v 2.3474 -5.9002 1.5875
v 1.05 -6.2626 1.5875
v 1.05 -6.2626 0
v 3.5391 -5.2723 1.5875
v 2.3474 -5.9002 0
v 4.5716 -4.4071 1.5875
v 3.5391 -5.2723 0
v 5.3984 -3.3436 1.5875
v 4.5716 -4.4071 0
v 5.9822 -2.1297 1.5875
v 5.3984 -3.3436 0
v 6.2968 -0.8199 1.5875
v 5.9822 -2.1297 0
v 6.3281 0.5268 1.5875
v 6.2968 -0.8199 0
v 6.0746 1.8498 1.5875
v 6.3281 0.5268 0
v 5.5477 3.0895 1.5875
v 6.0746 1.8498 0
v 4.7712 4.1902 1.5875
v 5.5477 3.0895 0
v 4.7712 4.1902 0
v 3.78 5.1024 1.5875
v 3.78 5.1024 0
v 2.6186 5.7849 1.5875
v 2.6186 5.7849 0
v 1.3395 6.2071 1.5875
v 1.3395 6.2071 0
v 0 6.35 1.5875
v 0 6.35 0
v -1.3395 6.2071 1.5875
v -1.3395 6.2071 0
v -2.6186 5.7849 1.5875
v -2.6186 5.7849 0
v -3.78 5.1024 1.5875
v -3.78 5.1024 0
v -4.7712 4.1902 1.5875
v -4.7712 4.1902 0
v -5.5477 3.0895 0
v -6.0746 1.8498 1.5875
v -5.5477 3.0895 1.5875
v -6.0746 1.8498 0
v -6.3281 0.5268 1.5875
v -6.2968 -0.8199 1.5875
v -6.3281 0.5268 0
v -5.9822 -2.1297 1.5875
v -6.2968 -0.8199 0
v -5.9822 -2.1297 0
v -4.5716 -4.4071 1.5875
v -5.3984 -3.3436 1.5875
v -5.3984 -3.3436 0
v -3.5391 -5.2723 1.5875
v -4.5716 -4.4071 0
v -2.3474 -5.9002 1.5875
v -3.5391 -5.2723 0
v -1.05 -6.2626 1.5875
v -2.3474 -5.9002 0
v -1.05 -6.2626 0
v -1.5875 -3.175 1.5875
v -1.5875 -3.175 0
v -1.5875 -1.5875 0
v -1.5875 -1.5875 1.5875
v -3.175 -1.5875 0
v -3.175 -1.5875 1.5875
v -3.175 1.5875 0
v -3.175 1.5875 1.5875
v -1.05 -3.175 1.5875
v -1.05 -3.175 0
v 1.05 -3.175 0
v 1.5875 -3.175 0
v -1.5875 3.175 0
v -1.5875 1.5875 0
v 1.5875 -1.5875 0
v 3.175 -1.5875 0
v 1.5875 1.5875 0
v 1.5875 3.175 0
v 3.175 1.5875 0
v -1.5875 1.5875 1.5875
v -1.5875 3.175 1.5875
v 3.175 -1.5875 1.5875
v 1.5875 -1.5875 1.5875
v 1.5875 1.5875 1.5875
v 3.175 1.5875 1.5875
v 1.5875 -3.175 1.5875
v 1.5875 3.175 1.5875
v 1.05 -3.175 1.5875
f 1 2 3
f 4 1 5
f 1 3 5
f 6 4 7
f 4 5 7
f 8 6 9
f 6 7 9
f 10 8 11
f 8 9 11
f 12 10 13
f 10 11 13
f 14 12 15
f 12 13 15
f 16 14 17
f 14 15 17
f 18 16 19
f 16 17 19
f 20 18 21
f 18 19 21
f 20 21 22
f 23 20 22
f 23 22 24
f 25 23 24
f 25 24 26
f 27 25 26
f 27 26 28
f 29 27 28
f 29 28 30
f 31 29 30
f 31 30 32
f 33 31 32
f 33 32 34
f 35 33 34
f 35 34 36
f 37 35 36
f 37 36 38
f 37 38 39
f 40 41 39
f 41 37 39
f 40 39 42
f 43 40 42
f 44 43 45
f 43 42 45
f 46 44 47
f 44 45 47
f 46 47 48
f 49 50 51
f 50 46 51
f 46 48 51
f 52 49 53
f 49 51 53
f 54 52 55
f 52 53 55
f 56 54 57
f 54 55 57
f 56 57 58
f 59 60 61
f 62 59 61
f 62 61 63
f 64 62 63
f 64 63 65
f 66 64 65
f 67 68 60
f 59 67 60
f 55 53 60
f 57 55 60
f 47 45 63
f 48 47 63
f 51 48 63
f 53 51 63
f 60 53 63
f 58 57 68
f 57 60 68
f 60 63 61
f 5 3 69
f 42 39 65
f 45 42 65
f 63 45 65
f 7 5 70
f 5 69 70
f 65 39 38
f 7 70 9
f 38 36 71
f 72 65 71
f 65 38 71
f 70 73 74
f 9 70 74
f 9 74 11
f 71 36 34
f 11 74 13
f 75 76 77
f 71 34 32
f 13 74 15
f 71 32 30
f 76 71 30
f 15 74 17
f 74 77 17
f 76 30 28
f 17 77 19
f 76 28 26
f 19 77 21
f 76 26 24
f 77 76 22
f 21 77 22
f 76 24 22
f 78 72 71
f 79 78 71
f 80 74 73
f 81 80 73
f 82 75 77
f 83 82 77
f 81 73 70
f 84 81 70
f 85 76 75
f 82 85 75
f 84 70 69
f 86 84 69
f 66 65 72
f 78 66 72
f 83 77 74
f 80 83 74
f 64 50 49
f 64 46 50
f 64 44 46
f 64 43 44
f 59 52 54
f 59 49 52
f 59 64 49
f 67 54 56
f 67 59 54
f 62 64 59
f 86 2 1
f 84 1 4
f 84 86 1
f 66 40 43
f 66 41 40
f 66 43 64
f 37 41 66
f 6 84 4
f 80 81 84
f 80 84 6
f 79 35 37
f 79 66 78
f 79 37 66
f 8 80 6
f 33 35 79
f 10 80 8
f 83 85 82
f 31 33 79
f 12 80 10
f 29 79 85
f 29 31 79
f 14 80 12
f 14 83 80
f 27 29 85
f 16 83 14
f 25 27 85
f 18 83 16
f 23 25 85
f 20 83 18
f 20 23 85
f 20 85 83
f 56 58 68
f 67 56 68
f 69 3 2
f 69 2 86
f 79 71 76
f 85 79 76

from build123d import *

# Parameters (mm, degrees)
SKETCH1_R           = 6.35
BOSS_EXTRUDE1_DEPTH = 1.5875
SKETCH2_W           = 2.1
SKETCH2_H           = 3.175
CUT_EXTRUDE1_DEPTH  = 10.119493201


with BuildPart() as part:
    # Sketch1 → Boss-Extrude1 (new body)
    with BuildSketch(Plane.XY):
        Circle(SKETCH1_R)
        Polygon((-3.175, -1.5875), (-3.175, 1.5875), (-1.5875, 1.5875), (-1.5875, 3.175), (1.5875, 3.175), (1.5875, 1.5875), (3.175, 1.5875), (3.175, -1.5875), (1.5875, -1.5875), (1.5875, -3.175), (-1.5875, -3.175), (-1.5875, -1.5875), align=None, mode=Mode.SUBTRACT)
    extrude(amount=BOSS_EXTRUDE1_DEPTH)

    # Sketch2 → Cut-Extrude1 (cut, through all)
    with BuildSketch(Plane(origin=(0, 0, 0), x_dir=(-1, 0, 0), z_dir=(0, 0, -1))):
        with Locations((0, -4.7625)):
            Rectangle(SKETCH2_W, SKETCH2_H)
    extrude(amount=-CUT_EXTRUDE1_DEPTH, mode=Mode.SUBTRACT)


solid = part.part
